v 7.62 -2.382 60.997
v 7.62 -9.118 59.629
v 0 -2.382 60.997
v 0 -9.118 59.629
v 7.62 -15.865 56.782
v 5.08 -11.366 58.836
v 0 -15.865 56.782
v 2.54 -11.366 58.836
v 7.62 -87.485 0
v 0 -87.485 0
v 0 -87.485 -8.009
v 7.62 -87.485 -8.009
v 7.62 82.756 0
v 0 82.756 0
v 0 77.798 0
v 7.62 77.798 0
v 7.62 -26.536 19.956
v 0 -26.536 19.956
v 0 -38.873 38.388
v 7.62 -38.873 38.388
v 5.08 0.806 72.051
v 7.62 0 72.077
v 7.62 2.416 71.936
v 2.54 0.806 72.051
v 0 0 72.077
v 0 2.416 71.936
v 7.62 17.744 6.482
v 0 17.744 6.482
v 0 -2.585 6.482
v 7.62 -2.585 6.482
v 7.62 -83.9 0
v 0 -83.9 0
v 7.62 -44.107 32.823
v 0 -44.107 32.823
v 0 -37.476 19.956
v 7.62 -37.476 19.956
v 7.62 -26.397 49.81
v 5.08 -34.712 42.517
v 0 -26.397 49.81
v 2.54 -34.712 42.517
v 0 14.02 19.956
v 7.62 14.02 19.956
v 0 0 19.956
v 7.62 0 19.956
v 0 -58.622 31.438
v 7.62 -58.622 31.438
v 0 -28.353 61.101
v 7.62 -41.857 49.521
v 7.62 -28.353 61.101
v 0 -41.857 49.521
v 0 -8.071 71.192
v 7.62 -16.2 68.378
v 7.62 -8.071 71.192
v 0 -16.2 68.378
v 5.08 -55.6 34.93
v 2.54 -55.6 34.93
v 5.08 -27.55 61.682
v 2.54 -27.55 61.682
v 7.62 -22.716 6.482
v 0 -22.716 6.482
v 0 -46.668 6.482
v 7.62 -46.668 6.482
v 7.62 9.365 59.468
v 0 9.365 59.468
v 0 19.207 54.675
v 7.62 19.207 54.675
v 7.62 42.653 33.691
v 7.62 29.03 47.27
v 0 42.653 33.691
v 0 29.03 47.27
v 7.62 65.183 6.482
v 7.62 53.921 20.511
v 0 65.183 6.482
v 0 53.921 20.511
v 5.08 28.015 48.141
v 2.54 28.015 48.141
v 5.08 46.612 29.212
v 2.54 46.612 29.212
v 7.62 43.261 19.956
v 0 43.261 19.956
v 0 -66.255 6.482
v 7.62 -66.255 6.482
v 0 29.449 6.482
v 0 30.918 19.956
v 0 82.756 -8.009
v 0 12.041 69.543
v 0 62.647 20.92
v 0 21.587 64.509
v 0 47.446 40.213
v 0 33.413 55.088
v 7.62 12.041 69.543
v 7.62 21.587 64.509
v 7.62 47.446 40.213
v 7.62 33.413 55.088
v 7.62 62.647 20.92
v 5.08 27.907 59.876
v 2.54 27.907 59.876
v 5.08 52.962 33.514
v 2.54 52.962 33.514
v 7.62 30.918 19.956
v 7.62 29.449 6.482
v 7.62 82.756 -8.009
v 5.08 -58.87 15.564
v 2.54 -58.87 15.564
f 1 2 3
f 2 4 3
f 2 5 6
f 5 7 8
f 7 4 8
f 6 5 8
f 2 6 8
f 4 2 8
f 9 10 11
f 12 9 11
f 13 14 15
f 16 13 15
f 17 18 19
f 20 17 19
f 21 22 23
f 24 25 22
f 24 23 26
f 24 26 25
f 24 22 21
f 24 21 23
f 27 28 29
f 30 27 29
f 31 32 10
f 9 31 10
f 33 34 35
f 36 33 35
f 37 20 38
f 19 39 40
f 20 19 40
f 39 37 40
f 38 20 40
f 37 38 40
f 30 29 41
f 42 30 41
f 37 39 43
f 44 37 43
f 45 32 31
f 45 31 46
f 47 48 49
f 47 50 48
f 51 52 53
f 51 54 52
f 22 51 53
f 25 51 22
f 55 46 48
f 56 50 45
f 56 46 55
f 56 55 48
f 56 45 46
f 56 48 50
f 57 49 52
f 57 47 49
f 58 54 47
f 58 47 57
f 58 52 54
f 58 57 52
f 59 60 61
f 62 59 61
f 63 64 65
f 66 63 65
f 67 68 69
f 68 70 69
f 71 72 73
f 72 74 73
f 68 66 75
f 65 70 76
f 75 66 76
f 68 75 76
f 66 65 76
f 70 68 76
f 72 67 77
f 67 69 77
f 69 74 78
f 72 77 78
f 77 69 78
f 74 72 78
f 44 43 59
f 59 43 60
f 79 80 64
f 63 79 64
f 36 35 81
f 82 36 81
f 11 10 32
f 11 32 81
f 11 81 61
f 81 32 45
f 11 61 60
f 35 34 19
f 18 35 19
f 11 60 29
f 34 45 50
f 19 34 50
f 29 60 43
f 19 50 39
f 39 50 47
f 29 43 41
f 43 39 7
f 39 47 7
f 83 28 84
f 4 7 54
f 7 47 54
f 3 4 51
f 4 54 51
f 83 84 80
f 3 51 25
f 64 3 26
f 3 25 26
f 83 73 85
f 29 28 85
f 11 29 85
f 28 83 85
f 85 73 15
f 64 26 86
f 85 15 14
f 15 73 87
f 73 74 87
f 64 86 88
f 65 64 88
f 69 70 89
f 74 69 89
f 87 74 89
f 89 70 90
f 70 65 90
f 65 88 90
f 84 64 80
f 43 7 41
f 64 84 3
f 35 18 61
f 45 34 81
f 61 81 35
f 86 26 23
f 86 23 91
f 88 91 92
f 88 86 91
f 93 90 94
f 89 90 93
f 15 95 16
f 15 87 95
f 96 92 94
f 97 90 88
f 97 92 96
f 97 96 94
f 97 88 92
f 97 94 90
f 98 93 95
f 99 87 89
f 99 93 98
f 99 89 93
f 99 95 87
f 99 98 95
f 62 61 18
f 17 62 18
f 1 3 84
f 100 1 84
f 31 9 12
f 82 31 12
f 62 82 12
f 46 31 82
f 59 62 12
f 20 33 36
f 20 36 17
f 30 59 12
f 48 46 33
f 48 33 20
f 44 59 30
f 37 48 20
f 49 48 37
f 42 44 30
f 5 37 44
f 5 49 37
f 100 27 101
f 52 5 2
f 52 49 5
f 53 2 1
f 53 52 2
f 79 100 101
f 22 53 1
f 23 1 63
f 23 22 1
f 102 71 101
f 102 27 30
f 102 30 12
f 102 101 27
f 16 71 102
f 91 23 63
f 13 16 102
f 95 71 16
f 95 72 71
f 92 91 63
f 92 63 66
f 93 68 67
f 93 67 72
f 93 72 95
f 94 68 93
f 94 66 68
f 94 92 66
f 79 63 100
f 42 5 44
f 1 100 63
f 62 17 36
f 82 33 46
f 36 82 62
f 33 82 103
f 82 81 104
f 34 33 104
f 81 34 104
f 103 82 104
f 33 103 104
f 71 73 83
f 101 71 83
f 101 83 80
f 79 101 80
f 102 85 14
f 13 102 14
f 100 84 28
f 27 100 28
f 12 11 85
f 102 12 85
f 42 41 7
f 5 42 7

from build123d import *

# Parameters (mm, degrees)
F1_DEPTH = 7.62


with BuildPart() as f1:
    # F0 (on Right) → F1 (new body)
    with BuildSketch(Plane.YZ):
        with BuildLine():
            Line((-83.8999077678, 0), (-76.0438218713, 0))
            Line((-76.0438218713, 0), (-68.3361637849, 0))
            Line((-68.3361637849, 0), (-65.6663442796, 0))
            Line((-65.6663442796, 0), (-59.0906857838, 0))
            Line((-59.0906857838, 0), (-56.6208846061, 0))
            Line((-56.6208846061, 0), (-50.1111261547, 0))
            Line((-50.1111261547, 0), (-47.2127646201, 0))
            Line((-47.2127646201, 0), (-40.9584082663, 0))
            Line((-40.9584082663, 0), (-38.0600504577, 0))
            Line((-38.0600504577, 0), (-31.6531471908, 0))
            Line((-31.6531471908, 0), (-28.9073325694, 0))
            Line((-28.9073325694, 0), (-22.5004293025, 0))
            Line((-22.5004293025, 0), (-19.9071597308, 0))
            Line((-19.9071597308, 0), (-13.4495065357, 0))
            Line((-13.4495065357, 0), (-10.754442774, 0))
            Line((-10.754442774, 0), (-4.1949953884, 0))
            Line((-4.1949953884, 0), (-1.6017258168, 0))
            Line((-1.6017258168, 0), (4.8051769845, 0))
            Line((4.8051769845, 0), (7.3984456249, 0))
            Line((7.3984456249, 0), (13.8053493574, 0))
            Line((13.8053493574, 0), (16.7037080973, 0))
            Line((16.7037080973, 0), (23.1106095016, 0))
            Line((23.1106095016, 0), (25.7038809359, 0))
            Line((25.7038809359, 0), (32.1107842028, 0))
            Line((32.1107842028, 0), (34.5515049994, 0))
            Line((34.5515049994, 0), (40.958404541, 0))
            Line((40.958404541, 0), (43.7042228877, 0))
            Line((43.7042228877, 0), (50.1111261552, 0))
            Line((50.1111261552, 0), (52.7043938637, 0))
            Line((52.7043938637, 0), (59.263844043, 0))
            Line((59.263844043, 0), (61.8571154775, 0))
            Line((61.8571154775, 0), (72.8403702378, 0))
            Line((72.8403702378, 0), (77.7980908751, 0))
            add(Edge.make_bspline(
                [(2.4155534392, 71.935541455), (28.1982811761, 69.4119022605), (52.9981860256, 34.7059511303), (77.7980908751, 0)],
                knots=[0.5202204491, 0.5202204491, 0.5202204491, 0.5202204491, 1, 1, 1, 1], degree=3))
            add(Edge.make_bspline(
                [(2.4155534392, 71.935541455), (23.457256807, 69.5741418959), (44.3202320999, 38.0280369375), (65.1832073927, 6.4819319791)],
                knots=[0.5194057291, 0.5194057291, 0.5194057291, 0.5194057291, 1, 1, 1, 1], degree=3))
            Line((65.1832073927, 6.4819319791), (29.4485222548, 6.4819319791))
            Line((29.4485222548, 6.4819319791), (17.7436252383, 6.4819319791))
            Line((17.7436252383, 6.4819319791), (-2.5848655496, 6.4819319791))
            Line((-2.5848655496, 6.4819319791), (-22.7159410715, 6.4819319791))
            Line((-22.7159410715, 6.4819319791), (-46.667508781, 6.4819319791))
            Line((-46.667508781, 6.4819319791), (-66.2550926208, 6.4819319791))
            add(Edge.make_bspline(
                [(-66.2550926208, 6.4819319791), (-44.7386888592, 38.3814174671), (-23.2222850975, 70.2809029552), (-1.8906832982, 72.0038712376)],
                knots=[0, 0, 0, 0, 0.4866401258, 0.4866401258, 0.4866401258, 0.4866401258], degree=3))
            add(Edge.make_bspline(
                [(-1.8906832982, 72.0038712376), (-1.2602925513, 72.0547883357), (-0.6300631821, 72.0793517198), (2.66e-08, 72.0767825841)],
                knots=[0.4866401258, 0.4866401258, 0.4866401258, 0.4866401258, 0.5010212977, 0.5010212977, 0.5010212977, 0.5010212977], degree=3))
            add(Edge.make_bspline(
                [(-83.8999077678, 0), (-55.5586168349, 36.2935873023), (-27.217325902, 72.5871746046), (0, 72.0767825842)],
                knots=[0, 0, 0, 0, 0.505255101, 0.505255101, 0.505255101, 0.505255101], degree=3))
        make_face()
        Polygon((-68.3361637849, 0), (-76.0438218713, 0), (-83.8999077678, 0), (-87.4847173691, 0), (-87.4847173691, -8.0094942823), (82.7558115125, -8.0094942823), (82.7558115125, 0), (77.7980908751, 0), (72.8403702378, 0), (61.8571154775, 0), (59.263844043, 0), (52.7043938637, 0), (50.1111261552, 0), (43.7042228877, 0), (40.958404541, 0), (34.5515049994, 0), (32.1107842028, 0), (25.7038809359, 0), (23.1106095016, 0), (16.7037080973, 0), (13.8053493574, 0), (7.3984456249, 0), (4.8051769845, 0), (-1.6017258168, 0), (-4.1949953884, 0), (-10.754442774, 0), (-13.4495065357, 0), (-19.9071597308, 0), (-22.5004293025, 0), (-28.9073325694, 0), (-31.6531471908, 0), (-38.0600504577, 0), (-40.9584082663, 0), (-47.2127646201, 0), (-50.1111261547, 0), (-56.6208846061, 0), (-59.0906857838, 0), (-65.6663442796, 0), align=None)
        with BuildLine():
            add(Edge.make_bspline(
                [(0, 72.0767825842), (0.8061606012, 72.0616650837), (1.6113351386, 72.0142591471), (2.4155534392, 71.935541455)],
                knots=[0.505255101, 0.505255101, 0.505255101, 0.505255101, 0.5202204491, 0.5202204491, 0.5202204491, 0.5202204491], degree=3))
            add(Edge.make_bspline(
                [(-1.8906832982, 72.0038712376), (-1.2602925513, 72.0547883357), (-0.6300631821, 72.0793517198), (2.66e-08, 72.0767825841)],
                knots=[0.4866401258, 0.4866401258, 0.4866401258, 0.4866401258, 0.5010212977, 0.5010212977, 0.5010212977, 0.5010212977], degree=3))
            add(Edge.make_bspline(
                [(-66.2550926208, 6.4819319791), (-44.7386888592, 38.3814174671), (-23.2222850975, 70.2809029552), (-1.8906832982, 72.0038712376)],
                knots=[0, 0, 0, 0, 0.4866401258, 0.4866401258, 0.4866401258, 0.4866401258], degree=3))
            add(Edge.make_bspline(
                [(-66.2550926208, 6.4819319791), (-58.870002531, 15.6014280008), (-51.4849124411, 24.7209240225), (-44.1068523116, 32.8232360474)],
                knots=[0, 0, 0, 0, 0.1671216862, 0.1671216862, 0.1671216862, 0.1671216862], degree=3))
            add(Edge.make_bspline(
                [(-44.1068523116, 32.8232360474), (-42.3619029204, 34.7394747588), (-40.6173467479, 36.5988175914), (-38.8732767924, 38.3878083756)],
                knots=[0.1671216862, 0.1671216862, 0.1671216862, 0.1671216862, 0.2066468296, 0.2066468296, 0.2066468296, 0.2066468296], degree=3))
            add(Edge.make_bspline(
                [(-38.8732767924, 38.3878083756), (-34.7114395699, 42.6568392208), (-30.5523710257, 46.5252625196), (-26.3973348433, 49.8102324575)],
                knots=[0.2066468296, 0.2066468296, 0.2066468296, 0.2066468296, 0.3009648428, 0.3009648428, 0.3009648428, 0.3009648428], degree=3))
            add(Edge.make_bspline(
                [(-26.3973348433, 49.8102324575), (-22.8832827761, 52.5884406113), (-19.3721149148, 54.9493251989), (-15.8645956908, 56.7822785692)],
                knots=[0.3009648428, 0.3009648428, 0.3009648428, 0.3009648428, 0.3807327183, 0.3807327183, 0.3807327183, 0.3807327183], degree=3))
            add(Edge.make_bspline(
                [(-15.8645956908, 56.7822785692), (-11.3638797078, 59.1342549956), (-6.8691712251, 60.6169899499), (-2.3820852822, 60.9967989829)],
                knots=[0.3807327183, 0.3807327183, 0.3807327183, 0.3807327183, 0.4830878387, 0.4830878387, 0.4830878387, 0.4830878387], degree=3))
            add(Edge.make_bspline(
                [(-2.3820852822, 60.9967989829), (-1.5878150287, 61.0640299254), (2.3324808206, 61.2253407539), (6.2467363494, 60.5126612784), (9.3648919901, 59.4680160873)],
                knots=[0.4830878387, 0.4830878387, 0.4830878387, 0.4830878387, 0.5012059734, 0.5725407835, 0.5725407835, 0.5725407835, 0.5725407835], degree=3))
            add(Edge.make_bspline(
                [(9.3648919901, 59.4680160873), (28.0498000323, 53.2081940706), (46.6165037125, 29.8450630249), (65.1832073927, 6.4819319791)],
                knots=[0.5725407835, 0.5725407835, 0.5725407835, 0.5725407835, 1, 1, 1, 1], degree=3))
            add(Edge.make_bspline(
                [(2.4155534392, 71.935541455), (23.457256807, 69.5741418959), (44.3202320999, 38.0280369375), (65.1832073927, 6.4819319791)],
                knots=[0.5194057291, 0.5194057291, 0.5194057291, 0.5194057291, 1, 1, 1, 1], degree=3))
        make_face()
        with BuildLine():
            Line((-37.4757476613, 19.9564792332), (-66.2550926208, 6.4819319791))
            Line((-66.2550926208, 6.4819319791), (-46.667508781, 6.4819319791))
            Line((-46.667508781, 6.4819319791), (-26.5364367513, 19.9564792332))
            Line((-26.5364367513, 19.9564792332), (-38.8732767924, 38.3878083756))
            add(Edge.make_bspline(
                [(-44.1068523116, 32.8232360474), (-42.3619029204, 34.7394747588), (-40.6173467479, 36.5988175914), (-38.8732767924, 38.3878083756)],
                knots=[0.1671216862, 0.1671216862, 0.1671216862, 0.1671216862, 0.2066468296, 0.2066468296, 0.2066468296, 0.2066468296], degree=3))
            Line((-44.1068523116, 32.8232360474), (-37.4757476613, 19.9564792332))
        make_face()
        with BuildLine():
            Line((17.7436252383, 6.4819319791), (29.4485222548, 6.4819319791))
            Line((29.4485222548, 6.4819319791), (43.261088431, 19.9564792332))
            Line((43.261088431, 19.9564792332), (9.3648919901, 59.4680160873))
            add(Edge.make_bspline(
                [(-2.3820852822, 60.9967989829), (-1.5878150287, 61.0640299254), (2.3324808206, 61.2253407539), (6.2467363494, 60.5126612784), (9.3648919901, 59.4680160873)],
                knots=[0.4830878387, 0.4830878387, 0.4830878387, 0.4830878387, 0.5012059734, 0.5725407835, 0.5725407835, 0.5725407835, 0.5725407835], degree=3))
            Line((-2.3820852822, 60.9967989829), (30.9179425241, 19.9564792332))
            Line((30.9179425241, 19.9564792332), (17.7436252383, 6.4819319791))
        make_face()
        with BuildLine():
            Line((0, 19.9564792332), (-22.7159410715, 6.4819319791))
            Line((-22.7159410715, 6.4819319791), (-2.5848655496, 6.4819319791))
            Line((-2.5848655496, 6.4819319791), (14.0195973219, 19.9564792332))
            Line((14.0195973219, 19.9564792332), (-15.8645956908, 56.7822785692))
            add(Edge.make_bspline(
                [(-26.3973348433, 49.8102324575), (-22.8832827761, 52.5884406113), (-19.3721149148, 54.9493251989), (-15.8645956908, 56.7822785692)],
                knots=[0.3009648428, 0.3009648428, 0.3009648428, 0.3009648428, 0.3807327183, 0.3807327183, 0.3807327183, 0.3807327183], degree=3))
            Line((-26.3973348433, 49.8102324575), (0, 19.9564792332))
        make_face()
    extrude(amount=F1_DEPTH)


solid = f1.part
